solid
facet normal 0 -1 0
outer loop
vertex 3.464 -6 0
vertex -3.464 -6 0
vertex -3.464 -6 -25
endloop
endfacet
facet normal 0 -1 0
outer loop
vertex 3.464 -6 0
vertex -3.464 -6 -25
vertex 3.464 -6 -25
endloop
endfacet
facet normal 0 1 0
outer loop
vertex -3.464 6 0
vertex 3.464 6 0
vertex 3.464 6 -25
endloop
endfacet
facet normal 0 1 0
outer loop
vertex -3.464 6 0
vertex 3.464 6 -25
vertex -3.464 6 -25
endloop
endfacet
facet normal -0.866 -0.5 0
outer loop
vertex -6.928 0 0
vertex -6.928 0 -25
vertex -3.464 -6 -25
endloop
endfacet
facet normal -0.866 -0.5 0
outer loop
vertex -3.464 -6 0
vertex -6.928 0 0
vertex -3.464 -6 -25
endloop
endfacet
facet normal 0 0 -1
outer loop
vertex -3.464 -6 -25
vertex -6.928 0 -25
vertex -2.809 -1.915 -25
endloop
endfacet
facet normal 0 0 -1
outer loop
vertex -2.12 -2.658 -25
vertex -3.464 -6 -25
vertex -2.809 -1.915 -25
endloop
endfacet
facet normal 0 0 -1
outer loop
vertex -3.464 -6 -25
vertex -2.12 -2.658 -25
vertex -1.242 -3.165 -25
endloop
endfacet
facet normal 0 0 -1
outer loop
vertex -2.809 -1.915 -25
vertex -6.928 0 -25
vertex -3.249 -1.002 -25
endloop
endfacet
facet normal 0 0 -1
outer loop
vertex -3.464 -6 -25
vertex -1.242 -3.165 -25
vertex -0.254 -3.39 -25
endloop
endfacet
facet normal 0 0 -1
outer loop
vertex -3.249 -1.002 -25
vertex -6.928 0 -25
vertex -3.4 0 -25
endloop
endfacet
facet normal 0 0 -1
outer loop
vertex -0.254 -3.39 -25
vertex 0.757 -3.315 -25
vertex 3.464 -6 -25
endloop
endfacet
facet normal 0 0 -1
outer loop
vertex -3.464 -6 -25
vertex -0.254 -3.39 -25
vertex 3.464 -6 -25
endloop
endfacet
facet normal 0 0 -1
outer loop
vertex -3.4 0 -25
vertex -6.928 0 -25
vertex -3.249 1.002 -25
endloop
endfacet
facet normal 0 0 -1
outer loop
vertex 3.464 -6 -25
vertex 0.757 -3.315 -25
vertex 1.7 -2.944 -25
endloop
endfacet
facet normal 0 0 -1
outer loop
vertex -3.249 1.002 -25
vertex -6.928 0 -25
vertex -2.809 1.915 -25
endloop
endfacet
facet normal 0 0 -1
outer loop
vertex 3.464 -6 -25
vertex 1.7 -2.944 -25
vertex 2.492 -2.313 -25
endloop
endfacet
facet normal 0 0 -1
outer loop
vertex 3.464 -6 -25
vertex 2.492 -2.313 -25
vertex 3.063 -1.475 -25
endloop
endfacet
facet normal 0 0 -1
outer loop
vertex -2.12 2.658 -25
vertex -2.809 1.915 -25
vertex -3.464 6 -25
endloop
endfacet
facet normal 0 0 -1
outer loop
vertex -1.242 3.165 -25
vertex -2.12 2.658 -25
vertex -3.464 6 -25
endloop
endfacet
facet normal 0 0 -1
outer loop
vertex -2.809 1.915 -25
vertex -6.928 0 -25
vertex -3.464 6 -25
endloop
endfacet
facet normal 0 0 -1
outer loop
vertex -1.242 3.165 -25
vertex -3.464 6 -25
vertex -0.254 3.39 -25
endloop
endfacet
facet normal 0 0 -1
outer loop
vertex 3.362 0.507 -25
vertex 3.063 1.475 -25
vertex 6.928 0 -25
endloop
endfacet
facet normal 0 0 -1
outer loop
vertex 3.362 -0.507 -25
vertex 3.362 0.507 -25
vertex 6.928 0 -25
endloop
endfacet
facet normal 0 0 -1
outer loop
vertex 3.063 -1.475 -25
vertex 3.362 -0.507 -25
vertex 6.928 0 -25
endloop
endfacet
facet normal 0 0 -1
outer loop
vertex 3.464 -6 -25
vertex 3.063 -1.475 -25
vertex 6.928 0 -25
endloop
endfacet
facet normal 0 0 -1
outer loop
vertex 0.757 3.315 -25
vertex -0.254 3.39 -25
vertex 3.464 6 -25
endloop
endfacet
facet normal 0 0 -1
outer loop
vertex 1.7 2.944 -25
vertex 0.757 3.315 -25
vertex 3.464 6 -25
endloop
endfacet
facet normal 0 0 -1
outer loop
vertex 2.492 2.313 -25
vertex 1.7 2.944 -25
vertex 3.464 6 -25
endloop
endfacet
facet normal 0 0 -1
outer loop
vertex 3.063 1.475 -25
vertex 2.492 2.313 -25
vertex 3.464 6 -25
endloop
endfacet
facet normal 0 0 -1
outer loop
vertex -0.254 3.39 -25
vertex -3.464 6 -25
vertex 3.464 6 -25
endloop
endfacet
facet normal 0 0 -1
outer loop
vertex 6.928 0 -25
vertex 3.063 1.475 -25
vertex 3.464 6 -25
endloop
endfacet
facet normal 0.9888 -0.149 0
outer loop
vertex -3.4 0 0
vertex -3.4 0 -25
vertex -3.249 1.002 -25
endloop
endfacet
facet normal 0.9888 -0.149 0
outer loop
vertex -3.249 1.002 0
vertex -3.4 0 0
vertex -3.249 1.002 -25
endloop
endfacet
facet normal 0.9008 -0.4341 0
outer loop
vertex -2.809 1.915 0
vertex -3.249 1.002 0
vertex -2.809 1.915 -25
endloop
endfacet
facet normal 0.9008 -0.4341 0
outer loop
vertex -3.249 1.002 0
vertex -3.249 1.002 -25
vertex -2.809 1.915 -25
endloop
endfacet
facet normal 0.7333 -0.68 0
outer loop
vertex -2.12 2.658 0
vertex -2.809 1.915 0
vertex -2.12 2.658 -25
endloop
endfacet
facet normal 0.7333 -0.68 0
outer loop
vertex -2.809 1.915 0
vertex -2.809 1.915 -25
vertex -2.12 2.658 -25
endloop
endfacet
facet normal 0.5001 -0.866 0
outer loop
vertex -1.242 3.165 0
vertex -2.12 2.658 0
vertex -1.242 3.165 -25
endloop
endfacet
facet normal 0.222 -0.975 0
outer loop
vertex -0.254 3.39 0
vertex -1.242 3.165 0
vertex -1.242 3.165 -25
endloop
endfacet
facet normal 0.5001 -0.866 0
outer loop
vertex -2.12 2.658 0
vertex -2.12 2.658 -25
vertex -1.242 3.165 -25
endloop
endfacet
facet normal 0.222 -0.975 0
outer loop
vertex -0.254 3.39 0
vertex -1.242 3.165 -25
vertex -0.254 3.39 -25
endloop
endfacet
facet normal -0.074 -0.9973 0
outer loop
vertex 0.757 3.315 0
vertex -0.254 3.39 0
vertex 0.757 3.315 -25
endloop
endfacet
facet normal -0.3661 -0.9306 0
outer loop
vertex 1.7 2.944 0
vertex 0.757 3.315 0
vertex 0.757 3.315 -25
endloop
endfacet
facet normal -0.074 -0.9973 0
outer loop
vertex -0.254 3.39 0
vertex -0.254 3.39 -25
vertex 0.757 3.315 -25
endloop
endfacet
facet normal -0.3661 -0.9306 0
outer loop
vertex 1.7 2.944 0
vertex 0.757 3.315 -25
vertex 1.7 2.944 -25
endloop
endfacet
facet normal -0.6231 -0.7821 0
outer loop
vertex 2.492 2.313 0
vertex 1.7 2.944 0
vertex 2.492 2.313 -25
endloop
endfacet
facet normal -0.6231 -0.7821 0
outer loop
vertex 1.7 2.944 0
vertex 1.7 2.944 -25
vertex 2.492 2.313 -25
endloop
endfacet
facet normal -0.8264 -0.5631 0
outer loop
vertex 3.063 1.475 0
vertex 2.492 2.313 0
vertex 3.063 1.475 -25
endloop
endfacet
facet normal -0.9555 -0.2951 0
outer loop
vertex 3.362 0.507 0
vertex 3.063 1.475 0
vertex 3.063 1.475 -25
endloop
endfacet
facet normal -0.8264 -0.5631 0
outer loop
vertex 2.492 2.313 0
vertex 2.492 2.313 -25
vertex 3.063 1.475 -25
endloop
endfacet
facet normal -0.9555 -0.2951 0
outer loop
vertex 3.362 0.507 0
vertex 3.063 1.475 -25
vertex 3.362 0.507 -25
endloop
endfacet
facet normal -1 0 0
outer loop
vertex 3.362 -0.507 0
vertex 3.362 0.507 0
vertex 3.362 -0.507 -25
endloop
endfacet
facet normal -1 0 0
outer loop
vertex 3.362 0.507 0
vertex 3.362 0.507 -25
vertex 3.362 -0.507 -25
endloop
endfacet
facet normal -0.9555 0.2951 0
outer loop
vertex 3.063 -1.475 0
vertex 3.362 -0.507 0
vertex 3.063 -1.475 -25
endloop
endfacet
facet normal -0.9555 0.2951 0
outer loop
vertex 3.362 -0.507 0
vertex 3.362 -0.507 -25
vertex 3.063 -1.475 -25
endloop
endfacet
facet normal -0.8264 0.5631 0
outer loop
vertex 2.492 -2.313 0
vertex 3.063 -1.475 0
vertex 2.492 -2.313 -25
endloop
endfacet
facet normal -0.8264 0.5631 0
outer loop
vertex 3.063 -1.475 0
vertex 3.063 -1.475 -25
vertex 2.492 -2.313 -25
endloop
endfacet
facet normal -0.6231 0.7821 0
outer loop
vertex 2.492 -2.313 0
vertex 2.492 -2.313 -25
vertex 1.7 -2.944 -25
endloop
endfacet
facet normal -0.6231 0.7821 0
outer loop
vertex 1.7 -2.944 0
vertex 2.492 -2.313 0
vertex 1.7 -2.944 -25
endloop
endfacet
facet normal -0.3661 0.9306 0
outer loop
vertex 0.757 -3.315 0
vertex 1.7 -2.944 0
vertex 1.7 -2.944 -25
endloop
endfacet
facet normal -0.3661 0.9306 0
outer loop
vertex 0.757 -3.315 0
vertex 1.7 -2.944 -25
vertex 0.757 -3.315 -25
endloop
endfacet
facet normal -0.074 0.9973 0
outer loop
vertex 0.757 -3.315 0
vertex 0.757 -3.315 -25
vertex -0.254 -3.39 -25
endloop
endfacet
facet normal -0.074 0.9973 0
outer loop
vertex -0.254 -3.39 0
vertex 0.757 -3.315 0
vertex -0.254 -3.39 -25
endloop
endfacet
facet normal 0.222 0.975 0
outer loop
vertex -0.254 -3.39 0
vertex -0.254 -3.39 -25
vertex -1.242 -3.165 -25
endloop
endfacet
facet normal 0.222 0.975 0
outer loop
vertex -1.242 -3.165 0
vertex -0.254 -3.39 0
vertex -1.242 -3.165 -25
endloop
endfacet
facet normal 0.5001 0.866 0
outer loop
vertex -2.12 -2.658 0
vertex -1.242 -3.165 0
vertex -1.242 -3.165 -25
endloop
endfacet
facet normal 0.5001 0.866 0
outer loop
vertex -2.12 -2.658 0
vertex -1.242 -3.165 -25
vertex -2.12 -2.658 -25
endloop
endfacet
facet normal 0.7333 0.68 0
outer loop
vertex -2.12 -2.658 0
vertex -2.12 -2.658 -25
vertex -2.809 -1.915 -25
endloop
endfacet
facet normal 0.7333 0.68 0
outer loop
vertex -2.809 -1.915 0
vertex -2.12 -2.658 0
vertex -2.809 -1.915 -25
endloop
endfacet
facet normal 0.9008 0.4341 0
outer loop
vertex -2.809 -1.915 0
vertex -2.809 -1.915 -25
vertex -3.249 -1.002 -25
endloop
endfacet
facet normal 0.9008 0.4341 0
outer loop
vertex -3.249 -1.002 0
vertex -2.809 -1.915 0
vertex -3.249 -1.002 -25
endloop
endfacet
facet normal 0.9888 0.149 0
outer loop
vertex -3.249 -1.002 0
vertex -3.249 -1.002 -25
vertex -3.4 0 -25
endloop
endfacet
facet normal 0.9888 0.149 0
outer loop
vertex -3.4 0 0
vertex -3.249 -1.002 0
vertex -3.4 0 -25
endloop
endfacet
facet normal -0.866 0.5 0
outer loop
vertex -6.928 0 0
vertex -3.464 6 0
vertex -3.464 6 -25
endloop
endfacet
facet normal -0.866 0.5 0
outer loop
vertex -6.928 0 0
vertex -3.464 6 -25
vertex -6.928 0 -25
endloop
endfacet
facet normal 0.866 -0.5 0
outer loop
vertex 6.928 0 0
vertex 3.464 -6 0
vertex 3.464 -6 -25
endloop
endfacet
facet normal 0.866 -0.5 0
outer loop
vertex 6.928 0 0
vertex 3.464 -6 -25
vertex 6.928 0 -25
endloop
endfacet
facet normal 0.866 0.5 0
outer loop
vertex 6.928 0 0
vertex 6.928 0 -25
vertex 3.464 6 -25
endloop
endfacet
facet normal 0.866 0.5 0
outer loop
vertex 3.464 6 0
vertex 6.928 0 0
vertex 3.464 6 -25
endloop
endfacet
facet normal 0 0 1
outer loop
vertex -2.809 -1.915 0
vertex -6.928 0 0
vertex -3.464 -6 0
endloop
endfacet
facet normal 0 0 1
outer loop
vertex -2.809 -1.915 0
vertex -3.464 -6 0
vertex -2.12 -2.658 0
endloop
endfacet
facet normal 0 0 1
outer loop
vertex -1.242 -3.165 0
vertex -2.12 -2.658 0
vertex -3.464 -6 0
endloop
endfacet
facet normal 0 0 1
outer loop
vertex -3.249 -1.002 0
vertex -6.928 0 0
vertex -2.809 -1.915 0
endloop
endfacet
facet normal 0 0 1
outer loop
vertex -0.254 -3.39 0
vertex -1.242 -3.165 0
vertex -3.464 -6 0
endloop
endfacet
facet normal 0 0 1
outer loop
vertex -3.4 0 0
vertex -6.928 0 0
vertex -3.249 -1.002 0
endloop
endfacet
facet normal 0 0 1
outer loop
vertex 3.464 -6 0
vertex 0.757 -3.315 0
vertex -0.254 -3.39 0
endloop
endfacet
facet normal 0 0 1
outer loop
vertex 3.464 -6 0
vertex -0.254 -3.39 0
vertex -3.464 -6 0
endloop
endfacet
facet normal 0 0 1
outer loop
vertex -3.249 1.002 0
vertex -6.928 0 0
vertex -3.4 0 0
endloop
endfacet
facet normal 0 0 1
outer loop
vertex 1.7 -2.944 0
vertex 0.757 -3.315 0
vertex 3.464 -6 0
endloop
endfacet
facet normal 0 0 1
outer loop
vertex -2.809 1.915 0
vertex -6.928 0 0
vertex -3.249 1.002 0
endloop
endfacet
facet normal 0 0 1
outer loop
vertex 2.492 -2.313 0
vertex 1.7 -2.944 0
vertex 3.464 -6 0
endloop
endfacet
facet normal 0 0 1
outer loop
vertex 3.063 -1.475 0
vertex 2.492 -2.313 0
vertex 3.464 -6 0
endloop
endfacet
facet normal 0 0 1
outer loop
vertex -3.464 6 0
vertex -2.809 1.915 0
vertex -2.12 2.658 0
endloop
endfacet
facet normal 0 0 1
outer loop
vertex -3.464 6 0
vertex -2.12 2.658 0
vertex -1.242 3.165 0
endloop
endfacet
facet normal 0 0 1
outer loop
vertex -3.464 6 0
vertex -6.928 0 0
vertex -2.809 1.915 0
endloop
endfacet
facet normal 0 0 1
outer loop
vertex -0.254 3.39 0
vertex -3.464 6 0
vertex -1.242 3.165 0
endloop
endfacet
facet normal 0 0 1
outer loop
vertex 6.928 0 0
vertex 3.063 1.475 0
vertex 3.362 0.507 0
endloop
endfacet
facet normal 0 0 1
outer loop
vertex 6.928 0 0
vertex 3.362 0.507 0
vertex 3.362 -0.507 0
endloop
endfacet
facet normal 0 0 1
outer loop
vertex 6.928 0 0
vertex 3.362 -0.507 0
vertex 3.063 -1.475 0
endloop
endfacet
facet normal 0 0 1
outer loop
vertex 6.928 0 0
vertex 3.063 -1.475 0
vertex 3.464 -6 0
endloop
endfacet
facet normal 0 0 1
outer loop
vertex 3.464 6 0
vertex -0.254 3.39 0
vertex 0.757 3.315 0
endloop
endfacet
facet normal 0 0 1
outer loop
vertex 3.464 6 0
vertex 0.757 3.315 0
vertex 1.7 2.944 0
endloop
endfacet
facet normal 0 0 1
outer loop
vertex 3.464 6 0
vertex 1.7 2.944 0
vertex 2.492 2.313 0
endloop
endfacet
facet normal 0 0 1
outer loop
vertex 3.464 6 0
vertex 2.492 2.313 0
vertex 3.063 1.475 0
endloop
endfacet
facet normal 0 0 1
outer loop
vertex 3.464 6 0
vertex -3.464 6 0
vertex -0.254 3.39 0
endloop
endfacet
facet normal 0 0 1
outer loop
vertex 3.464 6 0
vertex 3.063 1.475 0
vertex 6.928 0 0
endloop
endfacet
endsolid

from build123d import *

# Parameters (mm, degrees)
EXTRUDE_1_DEPTH  = 25
HOLE_WIZARD_M8_D = 6.8


with BuildPart() as part:
    # Эскиз1 → Бобышка-Вытянуть1 (new body)
    with BuildSketch(Plane.XY):
        Polygon((6.92820323, 0), (3.464101615, 6), (-3.464101615, 6), (-6.92820323, 0), (-3.464101615, -6), (3.464101615, -6), align=None)
    extrude(amount=-EXTRUDE_1_DEPTH)

    # M8 (through all)
    with Locations(Plane.XY):
        with Locations((0, 0)):
            Hole(HOLE_WIZARD_M8_D / 2)


solid = part.part
